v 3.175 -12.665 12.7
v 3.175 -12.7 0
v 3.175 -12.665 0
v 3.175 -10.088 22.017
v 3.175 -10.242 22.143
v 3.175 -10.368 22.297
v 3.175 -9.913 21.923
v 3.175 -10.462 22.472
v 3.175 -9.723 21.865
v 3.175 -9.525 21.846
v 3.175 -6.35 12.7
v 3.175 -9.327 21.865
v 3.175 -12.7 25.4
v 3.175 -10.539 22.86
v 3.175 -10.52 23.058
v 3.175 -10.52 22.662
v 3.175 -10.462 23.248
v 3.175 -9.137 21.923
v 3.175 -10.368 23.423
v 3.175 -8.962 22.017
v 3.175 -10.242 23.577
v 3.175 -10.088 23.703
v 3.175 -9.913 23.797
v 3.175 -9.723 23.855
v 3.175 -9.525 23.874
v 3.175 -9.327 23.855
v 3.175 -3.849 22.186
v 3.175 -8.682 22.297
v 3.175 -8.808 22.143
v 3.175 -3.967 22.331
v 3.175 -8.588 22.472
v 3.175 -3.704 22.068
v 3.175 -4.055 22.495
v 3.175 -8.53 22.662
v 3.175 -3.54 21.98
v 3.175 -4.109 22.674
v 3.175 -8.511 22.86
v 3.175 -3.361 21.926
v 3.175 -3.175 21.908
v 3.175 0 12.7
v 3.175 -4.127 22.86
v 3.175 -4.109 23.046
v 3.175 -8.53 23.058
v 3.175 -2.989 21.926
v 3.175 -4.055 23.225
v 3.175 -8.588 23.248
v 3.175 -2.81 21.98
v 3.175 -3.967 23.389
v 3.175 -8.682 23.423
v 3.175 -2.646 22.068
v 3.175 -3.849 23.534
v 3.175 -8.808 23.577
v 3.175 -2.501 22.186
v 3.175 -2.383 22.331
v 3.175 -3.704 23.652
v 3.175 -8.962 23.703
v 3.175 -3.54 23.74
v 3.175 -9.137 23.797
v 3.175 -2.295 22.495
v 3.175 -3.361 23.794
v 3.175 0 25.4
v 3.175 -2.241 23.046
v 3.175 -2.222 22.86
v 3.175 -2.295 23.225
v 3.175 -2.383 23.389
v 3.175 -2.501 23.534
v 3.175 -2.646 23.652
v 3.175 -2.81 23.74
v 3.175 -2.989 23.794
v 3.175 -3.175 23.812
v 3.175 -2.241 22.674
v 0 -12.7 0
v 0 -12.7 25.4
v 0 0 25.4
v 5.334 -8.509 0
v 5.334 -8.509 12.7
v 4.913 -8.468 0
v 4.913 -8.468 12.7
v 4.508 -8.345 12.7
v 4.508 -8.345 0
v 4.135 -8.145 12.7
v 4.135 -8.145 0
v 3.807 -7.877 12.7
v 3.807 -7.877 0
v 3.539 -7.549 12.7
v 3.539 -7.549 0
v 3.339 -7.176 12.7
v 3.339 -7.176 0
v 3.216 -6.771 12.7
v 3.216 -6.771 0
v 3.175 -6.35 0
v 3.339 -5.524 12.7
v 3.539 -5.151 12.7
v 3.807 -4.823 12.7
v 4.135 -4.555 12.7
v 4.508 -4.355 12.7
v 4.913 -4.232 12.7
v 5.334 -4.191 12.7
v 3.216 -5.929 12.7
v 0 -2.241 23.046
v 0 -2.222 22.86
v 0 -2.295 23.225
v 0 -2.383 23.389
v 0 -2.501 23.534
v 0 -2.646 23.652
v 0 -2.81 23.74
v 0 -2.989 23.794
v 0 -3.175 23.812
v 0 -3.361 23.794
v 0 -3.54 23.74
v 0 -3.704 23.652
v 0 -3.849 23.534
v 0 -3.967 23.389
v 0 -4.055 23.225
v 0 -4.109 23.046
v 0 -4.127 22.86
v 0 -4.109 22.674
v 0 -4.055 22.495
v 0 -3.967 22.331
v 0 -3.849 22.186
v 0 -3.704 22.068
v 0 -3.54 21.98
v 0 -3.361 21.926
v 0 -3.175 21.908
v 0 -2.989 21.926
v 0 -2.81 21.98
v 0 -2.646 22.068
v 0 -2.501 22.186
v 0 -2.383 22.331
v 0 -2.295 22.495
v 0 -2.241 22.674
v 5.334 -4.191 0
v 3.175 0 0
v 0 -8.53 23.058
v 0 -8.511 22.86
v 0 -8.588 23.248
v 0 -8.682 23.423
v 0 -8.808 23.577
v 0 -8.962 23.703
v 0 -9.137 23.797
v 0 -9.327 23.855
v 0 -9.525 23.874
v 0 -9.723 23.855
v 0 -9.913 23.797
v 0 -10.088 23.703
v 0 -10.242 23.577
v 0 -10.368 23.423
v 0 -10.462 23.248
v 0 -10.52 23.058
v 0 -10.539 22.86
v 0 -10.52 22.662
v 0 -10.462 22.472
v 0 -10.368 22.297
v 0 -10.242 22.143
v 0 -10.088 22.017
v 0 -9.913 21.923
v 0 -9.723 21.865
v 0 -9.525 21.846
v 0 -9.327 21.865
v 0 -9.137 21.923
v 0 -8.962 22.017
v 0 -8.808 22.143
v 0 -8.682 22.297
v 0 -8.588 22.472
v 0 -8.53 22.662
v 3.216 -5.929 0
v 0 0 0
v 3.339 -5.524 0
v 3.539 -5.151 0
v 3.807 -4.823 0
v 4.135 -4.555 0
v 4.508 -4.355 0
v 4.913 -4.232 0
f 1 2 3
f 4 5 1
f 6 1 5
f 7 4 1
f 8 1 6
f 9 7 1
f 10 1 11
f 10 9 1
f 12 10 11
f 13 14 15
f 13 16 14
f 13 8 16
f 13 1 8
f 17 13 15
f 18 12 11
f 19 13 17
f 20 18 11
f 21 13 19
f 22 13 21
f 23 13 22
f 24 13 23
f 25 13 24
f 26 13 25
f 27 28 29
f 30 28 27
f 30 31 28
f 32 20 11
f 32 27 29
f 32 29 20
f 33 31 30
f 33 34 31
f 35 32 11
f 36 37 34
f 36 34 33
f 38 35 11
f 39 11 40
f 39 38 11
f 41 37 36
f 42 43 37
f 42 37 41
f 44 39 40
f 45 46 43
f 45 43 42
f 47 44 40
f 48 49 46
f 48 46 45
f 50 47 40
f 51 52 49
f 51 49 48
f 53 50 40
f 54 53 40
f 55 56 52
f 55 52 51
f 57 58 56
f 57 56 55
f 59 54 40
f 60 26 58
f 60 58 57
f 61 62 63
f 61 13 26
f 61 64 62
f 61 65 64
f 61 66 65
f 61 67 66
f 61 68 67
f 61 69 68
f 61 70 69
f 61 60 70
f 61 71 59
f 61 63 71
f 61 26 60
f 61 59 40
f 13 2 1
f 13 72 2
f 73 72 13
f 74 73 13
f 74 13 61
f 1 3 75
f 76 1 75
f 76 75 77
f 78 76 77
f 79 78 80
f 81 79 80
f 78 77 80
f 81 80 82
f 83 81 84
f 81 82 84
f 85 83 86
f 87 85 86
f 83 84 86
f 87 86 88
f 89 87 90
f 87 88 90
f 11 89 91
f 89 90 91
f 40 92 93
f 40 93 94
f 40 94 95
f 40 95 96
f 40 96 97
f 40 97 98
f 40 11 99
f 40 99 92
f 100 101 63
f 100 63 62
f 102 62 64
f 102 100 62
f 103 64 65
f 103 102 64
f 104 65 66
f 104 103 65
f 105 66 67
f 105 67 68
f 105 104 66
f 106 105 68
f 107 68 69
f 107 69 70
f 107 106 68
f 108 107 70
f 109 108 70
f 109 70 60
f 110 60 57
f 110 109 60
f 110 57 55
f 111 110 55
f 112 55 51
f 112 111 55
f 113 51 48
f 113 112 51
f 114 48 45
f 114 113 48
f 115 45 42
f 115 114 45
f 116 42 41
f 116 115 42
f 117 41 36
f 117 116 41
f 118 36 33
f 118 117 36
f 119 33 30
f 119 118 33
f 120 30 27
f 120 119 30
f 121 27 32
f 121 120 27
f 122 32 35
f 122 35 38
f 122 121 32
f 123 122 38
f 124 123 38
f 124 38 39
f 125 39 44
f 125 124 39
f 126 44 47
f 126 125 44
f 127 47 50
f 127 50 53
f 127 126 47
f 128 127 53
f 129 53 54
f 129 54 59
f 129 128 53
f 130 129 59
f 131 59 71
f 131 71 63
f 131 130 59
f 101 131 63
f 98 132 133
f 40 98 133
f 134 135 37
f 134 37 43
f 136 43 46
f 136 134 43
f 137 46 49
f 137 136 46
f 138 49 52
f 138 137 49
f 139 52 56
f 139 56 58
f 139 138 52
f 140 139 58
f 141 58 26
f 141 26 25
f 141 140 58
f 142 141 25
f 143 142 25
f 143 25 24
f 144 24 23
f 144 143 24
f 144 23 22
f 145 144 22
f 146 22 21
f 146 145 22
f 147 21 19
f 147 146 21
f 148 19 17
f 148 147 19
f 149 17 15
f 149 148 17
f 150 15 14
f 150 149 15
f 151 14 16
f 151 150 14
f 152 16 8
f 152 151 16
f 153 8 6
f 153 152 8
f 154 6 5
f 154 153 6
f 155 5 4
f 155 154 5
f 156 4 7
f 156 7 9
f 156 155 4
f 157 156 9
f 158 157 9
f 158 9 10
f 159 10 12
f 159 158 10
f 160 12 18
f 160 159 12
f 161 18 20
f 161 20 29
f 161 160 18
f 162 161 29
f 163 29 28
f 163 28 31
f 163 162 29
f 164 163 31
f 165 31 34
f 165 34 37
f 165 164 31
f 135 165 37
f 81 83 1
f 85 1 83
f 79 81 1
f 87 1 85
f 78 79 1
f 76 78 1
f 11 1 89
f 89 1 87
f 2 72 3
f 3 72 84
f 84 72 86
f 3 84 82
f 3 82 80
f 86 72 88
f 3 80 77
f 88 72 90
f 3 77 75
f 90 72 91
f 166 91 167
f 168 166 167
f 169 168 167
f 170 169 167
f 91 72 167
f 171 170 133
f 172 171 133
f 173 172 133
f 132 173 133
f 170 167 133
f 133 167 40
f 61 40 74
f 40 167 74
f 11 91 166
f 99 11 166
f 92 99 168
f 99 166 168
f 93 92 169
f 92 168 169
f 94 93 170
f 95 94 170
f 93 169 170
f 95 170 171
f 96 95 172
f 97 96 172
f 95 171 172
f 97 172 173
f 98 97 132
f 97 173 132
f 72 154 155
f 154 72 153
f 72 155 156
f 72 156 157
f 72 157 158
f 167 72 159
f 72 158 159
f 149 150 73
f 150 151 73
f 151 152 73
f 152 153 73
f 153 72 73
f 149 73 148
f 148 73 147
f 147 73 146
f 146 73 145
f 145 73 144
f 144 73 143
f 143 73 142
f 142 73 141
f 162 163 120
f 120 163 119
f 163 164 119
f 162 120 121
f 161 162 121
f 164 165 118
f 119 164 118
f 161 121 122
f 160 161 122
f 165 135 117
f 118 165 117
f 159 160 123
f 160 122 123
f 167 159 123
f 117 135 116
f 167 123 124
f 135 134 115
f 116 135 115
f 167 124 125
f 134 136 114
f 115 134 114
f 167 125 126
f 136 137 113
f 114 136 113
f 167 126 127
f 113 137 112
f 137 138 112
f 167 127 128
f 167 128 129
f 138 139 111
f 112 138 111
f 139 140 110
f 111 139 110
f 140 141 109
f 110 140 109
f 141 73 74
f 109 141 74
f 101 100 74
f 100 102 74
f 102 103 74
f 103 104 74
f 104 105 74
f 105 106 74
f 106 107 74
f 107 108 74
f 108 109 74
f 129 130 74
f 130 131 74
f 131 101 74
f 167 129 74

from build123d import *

# Parameters (mm, degrees)
F0_W     = 12.7
F0_H     = 25.4
F0_R     = 1.014077
F0_R_2   = 0.9525
F1_DEPTH = 3.175
F3_DEPTH = 12.7


with BuildPart() as f1:
    # F0 (on Right) → F1 (new body)
    with BuildSketch(Plane.YZ):
        with Locations((-6.35, 12.7)):
            Rectangle(F0_W, F0_H)
        with Locations((-9.525, 22.86)):
            Circle(F0_R, mode=Mode.SUBTRACT)
        with Locations((-3.175, 22.86)):
            Circle(F0_R_2, mode=Mode.SUBTRACT)
    extrude(amount=F1_DEPTH)

    # F2 (on Top) → F3 (join)
    with BuildSketch(Plane.XY):
        with BuildLine():
            ThreePointArc((5.334, -8.509), (3.807356, -7.876644), (3.175, -6.35))
            Line((3.175, -6.35), (3.175, -12.664954))
            Line((3.175, -12.664954), (5.334, -8.509))
        make_face()
        with BuildLine():
            ThreePointArc((3.175, -6.35), (3.807356, -4.823356), (5.334, -4.191))
            Line((5.334, -4.191), (3.175, 0))
            Line((3.175, 0), (3.175, -6.35))
        make_face()
    extrude(amount=F3_DEPTH)


solid = f1.part
